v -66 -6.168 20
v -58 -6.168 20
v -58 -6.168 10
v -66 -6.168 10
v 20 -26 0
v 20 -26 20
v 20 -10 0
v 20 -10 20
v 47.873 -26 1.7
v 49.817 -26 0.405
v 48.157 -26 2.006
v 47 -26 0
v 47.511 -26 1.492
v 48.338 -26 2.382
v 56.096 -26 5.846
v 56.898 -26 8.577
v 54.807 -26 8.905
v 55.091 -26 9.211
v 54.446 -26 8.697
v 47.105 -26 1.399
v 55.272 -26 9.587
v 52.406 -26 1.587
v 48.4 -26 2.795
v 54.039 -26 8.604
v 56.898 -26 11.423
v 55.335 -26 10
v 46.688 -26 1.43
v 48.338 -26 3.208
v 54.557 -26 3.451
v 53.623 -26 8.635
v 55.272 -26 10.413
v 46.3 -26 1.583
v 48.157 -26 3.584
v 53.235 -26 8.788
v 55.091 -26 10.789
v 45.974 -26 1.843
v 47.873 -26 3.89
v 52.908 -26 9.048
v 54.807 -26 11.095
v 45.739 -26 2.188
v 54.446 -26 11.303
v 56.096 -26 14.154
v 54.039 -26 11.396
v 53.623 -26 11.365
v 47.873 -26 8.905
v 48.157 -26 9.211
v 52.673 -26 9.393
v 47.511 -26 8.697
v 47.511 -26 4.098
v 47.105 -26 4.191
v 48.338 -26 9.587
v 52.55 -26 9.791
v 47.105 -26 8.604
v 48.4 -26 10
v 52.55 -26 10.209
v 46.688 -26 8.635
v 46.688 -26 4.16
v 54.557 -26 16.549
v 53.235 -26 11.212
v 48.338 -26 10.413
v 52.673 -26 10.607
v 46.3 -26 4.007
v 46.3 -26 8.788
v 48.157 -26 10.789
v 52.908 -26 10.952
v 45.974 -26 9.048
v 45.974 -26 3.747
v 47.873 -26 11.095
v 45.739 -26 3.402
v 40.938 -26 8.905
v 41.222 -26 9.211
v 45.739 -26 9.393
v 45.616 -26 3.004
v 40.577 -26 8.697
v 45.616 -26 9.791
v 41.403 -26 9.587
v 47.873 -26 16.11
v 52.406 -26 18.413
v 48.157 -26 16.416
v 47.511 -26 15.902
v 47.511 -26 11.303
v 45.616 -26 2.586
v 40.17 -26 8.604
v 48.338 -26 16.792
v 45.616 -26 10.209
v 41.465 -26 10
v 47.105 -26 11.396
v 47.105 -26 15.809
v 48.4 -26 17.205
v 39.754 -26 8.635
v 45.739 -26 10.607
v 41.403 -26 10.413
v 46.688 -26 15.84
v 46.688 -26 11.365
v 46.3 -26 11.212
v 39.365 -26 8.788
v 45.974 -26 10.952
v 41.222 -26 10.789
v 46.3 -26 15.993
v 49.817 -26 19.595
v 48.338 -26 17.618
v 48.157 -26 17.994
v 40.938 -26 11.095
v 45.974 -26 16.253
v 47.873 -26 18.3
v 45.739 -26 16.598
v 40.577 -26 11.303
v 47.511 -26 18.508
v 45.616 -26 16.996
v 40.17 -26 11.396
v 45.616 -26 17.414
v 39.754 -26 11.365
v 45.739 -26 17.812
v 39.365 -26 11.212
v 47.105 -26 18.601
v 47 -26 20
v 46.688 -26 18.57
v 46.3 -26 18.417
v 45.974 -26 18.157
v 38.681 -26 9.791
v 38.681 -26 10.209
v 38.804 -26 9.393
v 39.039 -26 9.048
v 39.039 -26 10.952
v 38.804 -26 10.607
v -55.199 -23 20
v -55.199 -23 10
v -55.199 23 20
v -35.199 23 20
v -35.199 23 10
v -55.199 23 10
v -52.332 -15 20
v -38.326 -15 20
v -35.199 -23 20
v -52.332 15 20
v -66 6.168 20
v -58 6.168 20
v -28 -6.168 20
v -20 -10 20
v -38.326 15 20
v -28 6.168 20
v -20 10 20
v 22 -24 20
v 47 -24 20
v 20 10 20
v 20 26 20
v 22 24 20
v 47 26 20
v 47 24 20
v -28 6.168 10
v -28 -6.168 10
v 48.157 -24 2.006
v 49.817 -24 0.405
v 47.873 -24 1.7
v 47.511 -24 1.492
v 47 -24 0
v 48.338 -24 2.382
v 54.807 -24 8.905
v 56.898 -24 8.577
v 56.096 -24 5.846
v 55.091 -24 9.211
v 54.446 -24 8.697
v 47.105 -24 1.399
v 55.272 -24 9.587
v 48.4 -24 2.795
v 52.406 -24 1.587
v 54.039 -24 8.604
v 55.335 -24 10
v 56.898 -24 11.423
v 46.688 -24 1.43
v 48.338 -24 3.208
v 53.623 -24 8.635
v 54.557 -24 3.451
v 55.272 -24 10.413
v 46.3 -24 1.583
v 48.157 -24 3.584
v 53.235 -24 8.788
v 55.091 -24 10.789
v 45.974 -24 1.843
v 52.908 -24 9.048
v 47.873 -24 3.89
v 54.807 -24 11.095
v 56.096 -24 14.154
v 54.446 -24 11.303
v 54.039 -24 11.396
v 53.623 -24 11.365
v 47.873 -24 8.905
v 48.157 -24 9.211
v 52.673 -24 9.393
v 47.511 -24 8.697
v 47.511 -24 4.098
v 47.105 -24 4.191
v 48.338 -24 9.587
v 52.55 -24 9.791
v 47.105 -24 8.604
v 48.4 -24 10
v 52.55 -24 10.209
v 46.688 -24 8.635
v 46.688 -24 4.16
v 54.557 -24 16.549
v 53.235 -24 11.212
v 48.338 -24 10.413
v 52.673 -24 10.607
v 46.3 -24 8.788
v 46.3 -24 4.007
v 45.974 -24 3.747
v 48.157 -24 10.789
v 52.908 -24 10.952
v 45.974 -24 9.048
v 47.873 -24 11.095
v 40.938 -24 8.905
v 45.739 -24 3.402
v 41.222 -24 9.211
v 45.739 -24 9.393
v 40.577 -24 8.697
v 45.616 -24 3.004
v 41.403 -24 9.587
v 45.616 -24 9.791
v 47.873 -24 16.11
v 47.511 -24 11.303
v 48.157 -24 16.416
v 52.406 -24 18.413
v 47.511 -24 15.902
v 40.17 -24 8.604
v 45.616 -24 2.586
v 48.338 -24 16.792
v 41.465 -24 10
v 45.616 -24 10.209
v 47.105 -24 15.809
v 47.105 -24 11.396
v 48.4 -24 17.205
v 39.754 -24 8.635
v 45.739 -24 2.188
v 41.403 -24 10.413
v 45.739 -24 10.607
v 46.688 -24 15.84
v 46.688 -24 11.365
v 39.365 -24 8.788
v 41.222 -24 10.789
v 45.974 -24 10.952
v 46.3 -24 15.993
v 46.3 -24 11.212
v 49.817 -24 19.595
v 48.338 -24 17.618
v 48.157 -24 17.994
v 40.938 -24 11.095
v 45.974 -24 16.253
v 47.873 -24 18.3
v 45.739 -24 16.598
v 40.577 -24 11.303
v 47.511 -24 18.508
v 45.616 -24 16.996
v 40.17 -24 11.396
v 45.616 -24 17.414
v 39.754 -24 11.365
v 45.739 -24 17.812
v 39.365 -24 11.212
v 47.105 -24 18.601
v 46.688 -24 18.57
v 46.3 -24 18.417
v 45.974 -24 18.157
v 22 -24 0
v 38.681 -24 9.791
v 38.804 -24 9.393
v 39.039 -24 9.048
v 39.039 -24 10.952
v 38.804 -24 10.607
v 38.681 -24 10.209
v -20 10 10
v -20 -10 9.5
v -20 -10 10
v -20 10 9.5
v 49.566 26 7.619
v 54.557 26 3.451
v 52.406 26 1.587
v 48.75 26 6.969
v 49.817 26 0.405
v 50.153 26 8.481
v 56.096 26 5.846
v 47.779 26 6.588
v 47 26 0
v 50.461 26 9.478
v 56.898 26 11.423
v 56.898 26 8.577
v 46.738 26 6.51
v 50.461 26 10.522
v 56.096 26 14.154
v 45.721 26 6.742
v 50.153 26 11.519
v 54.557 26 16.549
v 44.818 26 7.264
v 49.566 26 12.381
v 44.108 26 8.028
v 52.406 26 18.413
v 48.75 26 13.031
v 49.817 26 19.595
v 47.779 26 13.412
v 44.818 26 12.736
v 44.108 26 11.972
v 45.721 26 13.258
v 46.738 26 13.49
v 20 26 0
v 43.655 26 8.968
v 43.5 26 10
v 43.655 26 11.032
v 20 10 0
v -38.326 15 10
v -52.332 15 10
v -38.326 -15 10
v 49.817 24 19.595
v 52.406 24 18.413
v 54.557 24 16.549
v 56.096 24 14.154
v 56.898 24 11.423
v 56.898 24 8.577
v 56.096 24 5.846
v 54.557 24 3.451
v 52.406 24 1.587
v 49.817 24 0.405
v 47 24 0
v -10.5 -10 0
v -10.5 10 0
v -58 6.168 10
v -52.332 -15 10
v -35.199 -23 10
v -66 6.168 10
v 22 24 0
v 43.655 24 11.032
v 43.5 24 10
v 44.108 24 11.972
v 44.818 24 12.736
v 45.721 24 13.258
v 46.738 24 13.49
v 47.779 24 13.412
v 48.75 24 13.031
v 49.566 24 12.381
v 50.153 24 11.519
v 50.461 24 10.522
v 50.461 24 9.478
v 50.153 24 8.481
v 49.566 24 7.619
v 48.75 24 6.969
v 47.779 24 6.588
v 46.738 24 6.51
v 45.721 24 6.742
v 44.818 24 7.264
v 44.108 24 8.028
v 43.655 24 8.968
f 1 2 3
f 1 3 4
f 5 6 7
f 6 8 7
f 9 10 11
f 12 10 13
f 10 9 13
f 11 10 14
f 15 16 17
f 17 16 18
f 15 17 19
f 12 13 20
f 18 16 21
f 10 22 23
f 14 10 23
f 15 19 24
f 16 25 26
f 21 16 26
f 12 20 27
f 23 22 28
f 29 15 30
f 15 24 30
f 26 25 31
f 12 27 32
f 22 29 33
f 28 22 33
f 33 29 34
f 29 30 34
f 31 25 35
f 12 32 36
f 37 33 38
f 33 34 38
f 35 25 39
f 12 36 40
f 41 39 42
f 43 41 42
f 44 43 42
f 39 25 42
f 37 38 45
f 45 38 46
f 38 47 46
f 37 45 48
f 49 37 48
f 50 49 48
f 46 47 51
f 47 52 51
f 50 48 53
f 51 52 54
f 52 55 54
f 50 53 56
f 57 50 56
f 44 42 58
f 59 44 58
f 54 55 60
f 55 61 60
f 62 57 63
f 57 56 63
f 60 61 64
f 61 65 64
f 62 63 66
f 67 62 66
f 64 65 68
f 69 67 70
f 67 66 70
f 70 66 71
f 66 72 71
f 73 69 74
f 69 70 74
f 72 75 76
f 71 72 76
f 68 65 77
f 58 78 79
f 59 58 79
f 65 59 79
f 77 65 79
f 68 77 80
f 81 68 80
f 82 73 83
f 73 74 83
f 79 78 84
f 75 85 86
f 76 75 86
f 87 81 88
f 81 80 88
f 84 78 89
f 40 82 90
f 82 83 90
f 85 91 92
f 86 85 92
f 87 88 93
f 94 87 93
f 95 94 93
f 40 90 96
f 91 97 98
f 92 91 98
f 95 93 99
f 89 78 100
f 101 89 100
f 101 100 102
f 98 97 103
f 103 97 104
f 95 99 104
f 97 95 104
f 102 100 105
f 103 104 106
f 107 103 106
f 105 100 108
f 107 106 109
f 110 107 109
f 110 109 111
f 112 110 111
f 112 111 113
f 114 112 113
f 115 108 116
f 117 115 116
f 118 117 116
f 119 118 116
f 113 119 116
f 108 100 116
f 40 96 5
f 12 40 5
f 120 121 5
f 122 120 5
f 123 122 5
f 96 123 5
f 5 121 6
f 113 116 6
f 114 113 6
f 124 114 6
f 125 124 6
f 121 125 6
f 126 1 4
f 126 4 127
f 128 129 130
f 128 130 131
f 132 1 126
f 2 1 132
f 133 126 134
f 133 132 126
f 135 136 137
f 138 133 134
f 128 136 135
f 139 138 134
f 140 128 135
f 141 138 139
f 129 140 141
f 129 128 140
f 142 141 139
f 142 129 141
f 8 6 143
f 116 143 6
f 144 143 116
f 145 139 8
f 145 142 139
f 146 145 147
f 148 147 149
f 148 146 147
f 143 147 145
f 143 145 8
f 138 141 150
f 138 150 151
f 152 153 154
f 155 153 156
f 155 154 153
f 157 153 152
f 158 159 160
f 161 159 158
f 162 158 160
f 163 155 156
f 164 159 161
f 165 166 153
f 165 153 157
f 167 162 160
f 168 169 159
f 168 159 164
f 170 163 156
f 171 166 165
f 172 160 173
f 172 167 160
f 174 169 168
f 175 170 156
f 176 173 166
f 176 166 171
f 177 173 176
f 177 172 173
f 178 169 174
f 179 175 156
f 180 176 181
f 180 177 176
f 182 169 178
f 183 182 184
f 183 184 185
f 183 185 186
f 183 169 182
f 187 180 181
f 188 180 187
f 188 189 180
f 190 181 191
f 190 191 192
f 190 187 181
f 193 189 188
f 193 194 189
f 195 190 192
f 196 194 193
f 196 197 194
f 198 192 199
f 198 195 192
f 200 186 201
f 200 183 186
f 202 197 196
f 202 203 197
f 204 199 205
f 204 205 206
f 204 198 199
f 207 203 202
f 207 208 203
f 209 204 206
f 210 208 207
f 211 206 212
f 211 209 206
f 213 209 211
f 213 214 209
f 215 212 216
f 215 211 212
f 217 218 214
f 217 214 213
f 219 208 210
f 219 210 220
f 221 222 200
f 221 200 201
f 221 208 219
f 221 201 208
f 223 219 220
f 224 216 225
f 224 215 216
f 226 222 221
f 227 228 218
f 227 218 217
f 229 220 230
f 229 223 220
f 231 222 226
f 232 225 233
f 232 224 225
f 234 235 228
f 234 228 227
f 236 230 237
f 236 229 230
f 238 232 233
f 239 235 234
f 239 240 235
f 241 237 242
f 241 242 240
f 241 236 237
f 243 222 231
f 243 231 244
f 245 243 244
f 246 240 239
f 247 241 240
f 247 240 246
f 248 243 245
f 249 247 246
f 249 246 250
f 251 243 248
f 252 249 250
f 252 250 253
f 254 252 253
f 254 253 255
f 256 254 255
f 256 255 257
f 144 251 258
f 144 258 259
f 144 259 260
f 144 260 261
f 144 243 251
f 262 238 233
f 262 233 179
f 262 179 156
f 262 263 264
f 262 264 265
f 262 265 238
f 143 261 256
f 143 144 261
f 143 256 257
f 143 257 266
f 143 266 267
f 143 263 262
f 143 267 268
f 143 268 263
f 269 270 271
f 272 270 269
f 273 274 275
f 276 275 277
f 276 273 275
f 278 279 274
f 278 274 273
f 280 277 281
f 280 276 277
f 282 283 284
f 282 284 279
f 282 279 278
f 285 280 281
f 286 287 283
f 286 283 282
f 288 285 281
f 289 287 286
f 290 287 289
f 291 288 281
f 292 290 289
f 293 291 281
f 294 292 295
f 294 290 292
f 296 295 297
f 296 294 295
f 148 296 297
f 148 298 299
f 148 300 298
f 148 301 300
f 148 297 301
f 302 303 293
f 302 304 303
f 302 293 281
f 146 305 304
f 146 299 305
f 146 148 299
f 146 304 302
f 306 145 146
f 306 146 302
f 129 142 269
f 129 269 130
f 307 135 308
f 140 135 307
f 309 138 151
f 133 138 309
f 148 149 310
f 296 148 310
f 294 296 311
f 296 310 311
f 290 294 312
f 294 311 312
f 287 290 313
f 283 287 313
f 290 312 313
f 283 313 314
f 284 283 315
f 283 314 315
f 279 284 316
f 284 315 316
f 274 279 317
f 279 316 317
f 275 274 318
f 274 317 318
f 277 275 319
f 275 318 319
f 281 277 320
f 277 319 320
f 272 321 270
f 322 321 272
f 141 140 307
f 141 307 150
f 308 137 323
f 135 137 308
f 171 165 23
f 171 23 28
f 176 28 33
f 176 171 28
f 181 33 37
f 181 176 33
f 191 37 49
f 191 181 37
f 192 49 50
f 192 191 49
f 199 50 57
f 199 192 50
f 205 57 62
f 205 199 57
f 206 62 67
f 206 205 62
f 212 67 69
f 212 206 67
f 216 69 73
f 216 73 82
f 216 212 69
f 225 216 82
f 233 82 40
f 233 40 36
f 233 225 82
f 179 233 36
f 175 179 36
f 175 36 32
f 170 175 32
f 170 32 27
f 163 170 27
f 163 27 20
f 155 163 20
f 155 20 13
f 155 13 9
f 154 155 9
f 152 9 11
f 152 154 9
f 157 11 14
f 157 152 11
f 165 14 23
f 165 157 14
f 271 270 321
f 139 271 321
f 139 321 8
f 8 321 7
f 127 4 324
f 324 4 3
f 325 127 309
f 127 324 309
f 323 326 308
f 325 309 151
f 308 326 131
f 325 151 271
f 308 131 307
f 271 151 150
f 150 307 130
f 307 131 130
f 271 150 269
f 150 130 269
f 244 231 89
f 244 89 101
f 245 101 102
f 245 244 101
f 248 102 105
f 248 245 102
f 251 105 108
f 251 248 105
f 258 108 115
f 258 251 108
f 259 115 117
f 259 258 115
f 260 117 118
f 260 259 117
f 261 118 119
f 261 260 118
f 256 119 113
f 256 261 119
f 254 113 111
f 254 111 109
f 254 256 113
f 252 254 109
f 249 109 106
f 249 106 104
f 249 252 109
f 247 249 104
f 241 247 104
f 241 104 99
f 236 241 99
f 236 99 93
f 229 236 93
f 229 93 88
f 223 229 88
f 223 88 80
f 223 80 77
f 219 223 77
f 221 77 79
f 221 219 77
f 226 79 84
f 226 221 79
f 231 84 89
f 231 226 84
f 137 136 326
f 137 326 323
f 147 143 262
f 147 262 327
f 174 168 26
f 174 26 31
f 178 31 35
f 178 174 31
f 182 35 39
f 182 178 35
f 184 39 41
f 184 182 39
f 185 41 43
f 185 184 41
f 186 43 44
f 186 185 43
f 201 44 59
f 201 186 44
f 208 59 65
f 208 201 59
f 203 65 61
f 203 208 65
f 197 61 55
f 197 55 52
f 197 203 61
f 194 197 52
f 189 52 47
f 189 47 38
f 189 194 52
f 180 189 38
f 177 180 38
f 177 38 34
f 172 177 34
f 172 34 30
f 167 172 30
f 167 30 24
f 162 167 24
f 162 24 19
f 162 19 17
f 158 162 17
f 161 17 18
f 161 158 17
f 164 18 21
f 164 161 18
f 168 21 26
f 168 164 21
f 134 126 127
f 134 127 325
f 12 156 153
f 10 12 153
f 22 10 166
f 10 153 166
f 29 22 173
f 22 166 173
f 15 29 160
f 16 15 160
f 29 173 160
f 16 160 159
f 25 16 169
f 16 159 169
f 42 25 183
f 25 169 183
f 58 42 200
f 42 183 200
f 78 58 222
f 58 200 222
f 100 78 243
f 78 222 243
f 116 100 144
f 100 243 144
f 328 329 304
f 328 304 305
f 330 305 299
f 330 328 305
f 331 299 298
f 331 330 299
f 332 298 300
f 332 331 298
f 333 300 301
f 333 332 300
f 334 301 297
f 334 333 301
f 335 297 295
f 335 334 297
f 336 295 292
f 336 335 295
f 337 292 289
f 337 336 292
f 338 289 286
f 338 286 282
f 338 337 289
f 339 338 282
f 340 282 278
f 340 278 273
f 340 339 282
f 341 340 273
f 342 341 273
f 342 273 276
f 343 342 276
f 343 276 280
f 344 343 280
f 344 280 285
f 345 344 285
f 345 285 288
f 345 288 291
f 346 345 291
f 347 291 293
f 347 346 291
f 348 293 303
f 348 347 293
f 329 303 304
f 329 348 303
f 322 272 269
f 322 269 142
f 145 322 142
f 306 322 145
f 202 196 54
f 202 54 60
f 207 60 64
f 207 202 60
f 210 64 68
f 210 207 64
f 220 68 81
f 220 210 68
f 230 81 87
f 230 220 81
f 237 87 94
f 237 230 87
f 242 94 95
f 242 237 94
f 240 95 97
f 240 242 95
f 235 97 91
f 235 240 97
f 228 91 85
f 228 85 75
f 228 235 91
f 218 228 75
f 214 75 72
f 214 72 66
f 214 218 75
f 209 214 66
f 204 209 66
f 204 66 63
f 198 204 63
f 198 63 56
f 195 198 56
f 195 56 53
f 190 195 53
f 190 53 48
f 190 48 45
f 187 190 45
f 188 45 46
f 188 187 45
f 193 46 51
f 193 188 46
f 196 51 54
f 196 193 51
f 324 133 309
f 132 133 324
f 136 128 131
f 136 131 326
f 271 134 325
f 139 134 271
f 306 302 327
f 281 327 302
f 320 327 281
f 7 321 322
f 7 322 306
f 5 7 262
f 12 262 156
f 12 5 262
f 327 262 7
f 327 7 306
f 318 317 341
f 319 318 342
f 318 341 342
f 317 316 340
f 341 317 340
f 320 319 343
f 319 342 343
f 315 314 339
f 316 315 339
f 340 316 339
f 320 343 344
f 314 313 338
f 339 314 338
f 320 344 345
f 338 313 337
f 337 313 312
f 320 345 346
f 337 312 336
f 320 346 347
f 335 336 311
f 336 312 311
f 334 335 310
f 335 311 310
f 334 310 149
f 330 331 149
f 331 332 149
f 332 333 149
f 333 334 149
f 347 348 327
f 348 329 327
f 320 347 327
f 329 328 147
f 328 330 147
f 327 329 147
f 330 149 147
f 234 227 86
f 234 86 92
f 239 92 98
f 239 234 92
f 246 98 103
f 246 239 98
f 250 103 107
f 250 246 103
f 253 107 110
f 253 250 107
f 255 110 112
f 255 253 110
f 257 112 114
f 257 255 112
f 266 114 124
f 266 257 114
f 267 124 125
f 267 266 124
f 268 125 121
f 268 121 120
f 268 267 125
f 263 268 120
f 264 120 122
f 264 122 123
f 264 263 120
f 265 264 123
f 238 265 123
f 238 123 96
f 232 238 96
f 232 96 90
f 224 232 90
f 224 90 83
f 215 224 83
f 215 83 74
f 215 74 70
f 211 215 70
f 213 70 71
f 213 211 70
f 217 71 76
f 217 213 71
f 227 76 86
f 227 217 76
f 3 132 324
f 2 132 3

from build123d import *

# Parameters (mm, degrees)
SKETCH_W     = 40
SKETCH_H     = 20
PAD_DEPTH    = 20
SKETCH001_W  = 48
SKETCH001_H  = 20
PAD001_DEPTH = 2
SKETCH002_R  = 1.4
PAD002_DEPTH = 2
SKETCH003_R  = 3.5
PAD003_DEPTH = 2
PAD004_DEPTH = 10
CHAMFER_SIZE = 9.5


with BuildPart() as part:
    # Sketch → Pad (new body)
    with BuildSketch(Plane.XY):
        Rectangle(SKETCH_W, SKETCH_H)
    extrude(amount=PAD_DEPTH)

    # Sketch001 (on Face2 of Pad) → Pad001 (join)
    with BuildSketch(Plane.YZ.offset(20)):
        with Locations((0, 10)):
            Rectangle(SKETCH001_W, SKETCH001_H)
    extrude(amount=PAD001_DEPTH)

    # Sketch002 (on Face2 of Pad001) → Pad002 (join)
    with BuildSketch(Plane.XZ.offset(24)):
        with BuildLine():
            Line((20, 20), (47, 20))
            ThreePointArc((47, 0), (57, 10), (47, 20))
            Line((20, 0), (47, 0))
            Line((20, 20), (20, 0))
        make_face()
        with Locations((47, 10)):
            Circle(SKETCH002_R, mode=Mode.SUBTRACT)
        with Locations((47, 17.205)):
            Circle(SKETCH002_R, mode=Mode.SUBTRACT)
        with Locations((53.934549, 10)):
            Circle(SKETCH002_R, mode=Mode.SUBTRACT)
        with Locations((47, 2.795)):
            Circle(SKETCH002_R, mode=Mode.SUBTRACT)
        with Locations((40.065451, 10)):
            Circle(SKETCH002_R, mode=Mode.SUBTRACT)
    extrude(amount=PAD002_DEPTH)

    # Sketch003 (on Face3 of Pad002) → Pad003 (join)
    with BuildSketch(Plane(origin=(0, 24, 0), x_dir=(-1, 0, 0), z_dir=(0, 1, 0))):
        with BuildLine():
            Line((-20, 20), (-47, 20))
            ThreePointArc((-47, 20), (-57, 10), (-47, 0))
            Line((-20, 0), (-47, 0))
            Line((-20, 20), (-20, 0))
        make_face()
        with Locations((-47, 10)):
            Circle(SKETCH003_R, mode=Mode.SUBTRACT)
    extrude(amount=PAD003_DEPTH)

    # Sketch004 (on Face5 of Pad003) → Pad004 (join)
    with BuildSketch(Plane.XY.offset(20)):
        Polygon((-20, 10), (-35.198684, 23), (-55.198684, 23), (-66, 6.167544), (-58, 6.167544), (-52.33225, 15), (-38.326285, 15), (-28, 6.167544), (-28, -6.167544), (-38.326285, -15), (-52.33225, -15), (-58, -6.167544), (-66, -6.167544), (-55.198684, -23), (-35.198684, -23), (-20, -10), align=None)
    extrude(amount=-PAD004_DEPTH)

    # Chamfer
    chamfer_edges = [part.edges().sort_by_distance(p)[0] for p in [
        (-20, 0, 0),
    ]]
    chamfer(chamfer_edges, length=CHAMFER_SIZE)


solid = part.part
